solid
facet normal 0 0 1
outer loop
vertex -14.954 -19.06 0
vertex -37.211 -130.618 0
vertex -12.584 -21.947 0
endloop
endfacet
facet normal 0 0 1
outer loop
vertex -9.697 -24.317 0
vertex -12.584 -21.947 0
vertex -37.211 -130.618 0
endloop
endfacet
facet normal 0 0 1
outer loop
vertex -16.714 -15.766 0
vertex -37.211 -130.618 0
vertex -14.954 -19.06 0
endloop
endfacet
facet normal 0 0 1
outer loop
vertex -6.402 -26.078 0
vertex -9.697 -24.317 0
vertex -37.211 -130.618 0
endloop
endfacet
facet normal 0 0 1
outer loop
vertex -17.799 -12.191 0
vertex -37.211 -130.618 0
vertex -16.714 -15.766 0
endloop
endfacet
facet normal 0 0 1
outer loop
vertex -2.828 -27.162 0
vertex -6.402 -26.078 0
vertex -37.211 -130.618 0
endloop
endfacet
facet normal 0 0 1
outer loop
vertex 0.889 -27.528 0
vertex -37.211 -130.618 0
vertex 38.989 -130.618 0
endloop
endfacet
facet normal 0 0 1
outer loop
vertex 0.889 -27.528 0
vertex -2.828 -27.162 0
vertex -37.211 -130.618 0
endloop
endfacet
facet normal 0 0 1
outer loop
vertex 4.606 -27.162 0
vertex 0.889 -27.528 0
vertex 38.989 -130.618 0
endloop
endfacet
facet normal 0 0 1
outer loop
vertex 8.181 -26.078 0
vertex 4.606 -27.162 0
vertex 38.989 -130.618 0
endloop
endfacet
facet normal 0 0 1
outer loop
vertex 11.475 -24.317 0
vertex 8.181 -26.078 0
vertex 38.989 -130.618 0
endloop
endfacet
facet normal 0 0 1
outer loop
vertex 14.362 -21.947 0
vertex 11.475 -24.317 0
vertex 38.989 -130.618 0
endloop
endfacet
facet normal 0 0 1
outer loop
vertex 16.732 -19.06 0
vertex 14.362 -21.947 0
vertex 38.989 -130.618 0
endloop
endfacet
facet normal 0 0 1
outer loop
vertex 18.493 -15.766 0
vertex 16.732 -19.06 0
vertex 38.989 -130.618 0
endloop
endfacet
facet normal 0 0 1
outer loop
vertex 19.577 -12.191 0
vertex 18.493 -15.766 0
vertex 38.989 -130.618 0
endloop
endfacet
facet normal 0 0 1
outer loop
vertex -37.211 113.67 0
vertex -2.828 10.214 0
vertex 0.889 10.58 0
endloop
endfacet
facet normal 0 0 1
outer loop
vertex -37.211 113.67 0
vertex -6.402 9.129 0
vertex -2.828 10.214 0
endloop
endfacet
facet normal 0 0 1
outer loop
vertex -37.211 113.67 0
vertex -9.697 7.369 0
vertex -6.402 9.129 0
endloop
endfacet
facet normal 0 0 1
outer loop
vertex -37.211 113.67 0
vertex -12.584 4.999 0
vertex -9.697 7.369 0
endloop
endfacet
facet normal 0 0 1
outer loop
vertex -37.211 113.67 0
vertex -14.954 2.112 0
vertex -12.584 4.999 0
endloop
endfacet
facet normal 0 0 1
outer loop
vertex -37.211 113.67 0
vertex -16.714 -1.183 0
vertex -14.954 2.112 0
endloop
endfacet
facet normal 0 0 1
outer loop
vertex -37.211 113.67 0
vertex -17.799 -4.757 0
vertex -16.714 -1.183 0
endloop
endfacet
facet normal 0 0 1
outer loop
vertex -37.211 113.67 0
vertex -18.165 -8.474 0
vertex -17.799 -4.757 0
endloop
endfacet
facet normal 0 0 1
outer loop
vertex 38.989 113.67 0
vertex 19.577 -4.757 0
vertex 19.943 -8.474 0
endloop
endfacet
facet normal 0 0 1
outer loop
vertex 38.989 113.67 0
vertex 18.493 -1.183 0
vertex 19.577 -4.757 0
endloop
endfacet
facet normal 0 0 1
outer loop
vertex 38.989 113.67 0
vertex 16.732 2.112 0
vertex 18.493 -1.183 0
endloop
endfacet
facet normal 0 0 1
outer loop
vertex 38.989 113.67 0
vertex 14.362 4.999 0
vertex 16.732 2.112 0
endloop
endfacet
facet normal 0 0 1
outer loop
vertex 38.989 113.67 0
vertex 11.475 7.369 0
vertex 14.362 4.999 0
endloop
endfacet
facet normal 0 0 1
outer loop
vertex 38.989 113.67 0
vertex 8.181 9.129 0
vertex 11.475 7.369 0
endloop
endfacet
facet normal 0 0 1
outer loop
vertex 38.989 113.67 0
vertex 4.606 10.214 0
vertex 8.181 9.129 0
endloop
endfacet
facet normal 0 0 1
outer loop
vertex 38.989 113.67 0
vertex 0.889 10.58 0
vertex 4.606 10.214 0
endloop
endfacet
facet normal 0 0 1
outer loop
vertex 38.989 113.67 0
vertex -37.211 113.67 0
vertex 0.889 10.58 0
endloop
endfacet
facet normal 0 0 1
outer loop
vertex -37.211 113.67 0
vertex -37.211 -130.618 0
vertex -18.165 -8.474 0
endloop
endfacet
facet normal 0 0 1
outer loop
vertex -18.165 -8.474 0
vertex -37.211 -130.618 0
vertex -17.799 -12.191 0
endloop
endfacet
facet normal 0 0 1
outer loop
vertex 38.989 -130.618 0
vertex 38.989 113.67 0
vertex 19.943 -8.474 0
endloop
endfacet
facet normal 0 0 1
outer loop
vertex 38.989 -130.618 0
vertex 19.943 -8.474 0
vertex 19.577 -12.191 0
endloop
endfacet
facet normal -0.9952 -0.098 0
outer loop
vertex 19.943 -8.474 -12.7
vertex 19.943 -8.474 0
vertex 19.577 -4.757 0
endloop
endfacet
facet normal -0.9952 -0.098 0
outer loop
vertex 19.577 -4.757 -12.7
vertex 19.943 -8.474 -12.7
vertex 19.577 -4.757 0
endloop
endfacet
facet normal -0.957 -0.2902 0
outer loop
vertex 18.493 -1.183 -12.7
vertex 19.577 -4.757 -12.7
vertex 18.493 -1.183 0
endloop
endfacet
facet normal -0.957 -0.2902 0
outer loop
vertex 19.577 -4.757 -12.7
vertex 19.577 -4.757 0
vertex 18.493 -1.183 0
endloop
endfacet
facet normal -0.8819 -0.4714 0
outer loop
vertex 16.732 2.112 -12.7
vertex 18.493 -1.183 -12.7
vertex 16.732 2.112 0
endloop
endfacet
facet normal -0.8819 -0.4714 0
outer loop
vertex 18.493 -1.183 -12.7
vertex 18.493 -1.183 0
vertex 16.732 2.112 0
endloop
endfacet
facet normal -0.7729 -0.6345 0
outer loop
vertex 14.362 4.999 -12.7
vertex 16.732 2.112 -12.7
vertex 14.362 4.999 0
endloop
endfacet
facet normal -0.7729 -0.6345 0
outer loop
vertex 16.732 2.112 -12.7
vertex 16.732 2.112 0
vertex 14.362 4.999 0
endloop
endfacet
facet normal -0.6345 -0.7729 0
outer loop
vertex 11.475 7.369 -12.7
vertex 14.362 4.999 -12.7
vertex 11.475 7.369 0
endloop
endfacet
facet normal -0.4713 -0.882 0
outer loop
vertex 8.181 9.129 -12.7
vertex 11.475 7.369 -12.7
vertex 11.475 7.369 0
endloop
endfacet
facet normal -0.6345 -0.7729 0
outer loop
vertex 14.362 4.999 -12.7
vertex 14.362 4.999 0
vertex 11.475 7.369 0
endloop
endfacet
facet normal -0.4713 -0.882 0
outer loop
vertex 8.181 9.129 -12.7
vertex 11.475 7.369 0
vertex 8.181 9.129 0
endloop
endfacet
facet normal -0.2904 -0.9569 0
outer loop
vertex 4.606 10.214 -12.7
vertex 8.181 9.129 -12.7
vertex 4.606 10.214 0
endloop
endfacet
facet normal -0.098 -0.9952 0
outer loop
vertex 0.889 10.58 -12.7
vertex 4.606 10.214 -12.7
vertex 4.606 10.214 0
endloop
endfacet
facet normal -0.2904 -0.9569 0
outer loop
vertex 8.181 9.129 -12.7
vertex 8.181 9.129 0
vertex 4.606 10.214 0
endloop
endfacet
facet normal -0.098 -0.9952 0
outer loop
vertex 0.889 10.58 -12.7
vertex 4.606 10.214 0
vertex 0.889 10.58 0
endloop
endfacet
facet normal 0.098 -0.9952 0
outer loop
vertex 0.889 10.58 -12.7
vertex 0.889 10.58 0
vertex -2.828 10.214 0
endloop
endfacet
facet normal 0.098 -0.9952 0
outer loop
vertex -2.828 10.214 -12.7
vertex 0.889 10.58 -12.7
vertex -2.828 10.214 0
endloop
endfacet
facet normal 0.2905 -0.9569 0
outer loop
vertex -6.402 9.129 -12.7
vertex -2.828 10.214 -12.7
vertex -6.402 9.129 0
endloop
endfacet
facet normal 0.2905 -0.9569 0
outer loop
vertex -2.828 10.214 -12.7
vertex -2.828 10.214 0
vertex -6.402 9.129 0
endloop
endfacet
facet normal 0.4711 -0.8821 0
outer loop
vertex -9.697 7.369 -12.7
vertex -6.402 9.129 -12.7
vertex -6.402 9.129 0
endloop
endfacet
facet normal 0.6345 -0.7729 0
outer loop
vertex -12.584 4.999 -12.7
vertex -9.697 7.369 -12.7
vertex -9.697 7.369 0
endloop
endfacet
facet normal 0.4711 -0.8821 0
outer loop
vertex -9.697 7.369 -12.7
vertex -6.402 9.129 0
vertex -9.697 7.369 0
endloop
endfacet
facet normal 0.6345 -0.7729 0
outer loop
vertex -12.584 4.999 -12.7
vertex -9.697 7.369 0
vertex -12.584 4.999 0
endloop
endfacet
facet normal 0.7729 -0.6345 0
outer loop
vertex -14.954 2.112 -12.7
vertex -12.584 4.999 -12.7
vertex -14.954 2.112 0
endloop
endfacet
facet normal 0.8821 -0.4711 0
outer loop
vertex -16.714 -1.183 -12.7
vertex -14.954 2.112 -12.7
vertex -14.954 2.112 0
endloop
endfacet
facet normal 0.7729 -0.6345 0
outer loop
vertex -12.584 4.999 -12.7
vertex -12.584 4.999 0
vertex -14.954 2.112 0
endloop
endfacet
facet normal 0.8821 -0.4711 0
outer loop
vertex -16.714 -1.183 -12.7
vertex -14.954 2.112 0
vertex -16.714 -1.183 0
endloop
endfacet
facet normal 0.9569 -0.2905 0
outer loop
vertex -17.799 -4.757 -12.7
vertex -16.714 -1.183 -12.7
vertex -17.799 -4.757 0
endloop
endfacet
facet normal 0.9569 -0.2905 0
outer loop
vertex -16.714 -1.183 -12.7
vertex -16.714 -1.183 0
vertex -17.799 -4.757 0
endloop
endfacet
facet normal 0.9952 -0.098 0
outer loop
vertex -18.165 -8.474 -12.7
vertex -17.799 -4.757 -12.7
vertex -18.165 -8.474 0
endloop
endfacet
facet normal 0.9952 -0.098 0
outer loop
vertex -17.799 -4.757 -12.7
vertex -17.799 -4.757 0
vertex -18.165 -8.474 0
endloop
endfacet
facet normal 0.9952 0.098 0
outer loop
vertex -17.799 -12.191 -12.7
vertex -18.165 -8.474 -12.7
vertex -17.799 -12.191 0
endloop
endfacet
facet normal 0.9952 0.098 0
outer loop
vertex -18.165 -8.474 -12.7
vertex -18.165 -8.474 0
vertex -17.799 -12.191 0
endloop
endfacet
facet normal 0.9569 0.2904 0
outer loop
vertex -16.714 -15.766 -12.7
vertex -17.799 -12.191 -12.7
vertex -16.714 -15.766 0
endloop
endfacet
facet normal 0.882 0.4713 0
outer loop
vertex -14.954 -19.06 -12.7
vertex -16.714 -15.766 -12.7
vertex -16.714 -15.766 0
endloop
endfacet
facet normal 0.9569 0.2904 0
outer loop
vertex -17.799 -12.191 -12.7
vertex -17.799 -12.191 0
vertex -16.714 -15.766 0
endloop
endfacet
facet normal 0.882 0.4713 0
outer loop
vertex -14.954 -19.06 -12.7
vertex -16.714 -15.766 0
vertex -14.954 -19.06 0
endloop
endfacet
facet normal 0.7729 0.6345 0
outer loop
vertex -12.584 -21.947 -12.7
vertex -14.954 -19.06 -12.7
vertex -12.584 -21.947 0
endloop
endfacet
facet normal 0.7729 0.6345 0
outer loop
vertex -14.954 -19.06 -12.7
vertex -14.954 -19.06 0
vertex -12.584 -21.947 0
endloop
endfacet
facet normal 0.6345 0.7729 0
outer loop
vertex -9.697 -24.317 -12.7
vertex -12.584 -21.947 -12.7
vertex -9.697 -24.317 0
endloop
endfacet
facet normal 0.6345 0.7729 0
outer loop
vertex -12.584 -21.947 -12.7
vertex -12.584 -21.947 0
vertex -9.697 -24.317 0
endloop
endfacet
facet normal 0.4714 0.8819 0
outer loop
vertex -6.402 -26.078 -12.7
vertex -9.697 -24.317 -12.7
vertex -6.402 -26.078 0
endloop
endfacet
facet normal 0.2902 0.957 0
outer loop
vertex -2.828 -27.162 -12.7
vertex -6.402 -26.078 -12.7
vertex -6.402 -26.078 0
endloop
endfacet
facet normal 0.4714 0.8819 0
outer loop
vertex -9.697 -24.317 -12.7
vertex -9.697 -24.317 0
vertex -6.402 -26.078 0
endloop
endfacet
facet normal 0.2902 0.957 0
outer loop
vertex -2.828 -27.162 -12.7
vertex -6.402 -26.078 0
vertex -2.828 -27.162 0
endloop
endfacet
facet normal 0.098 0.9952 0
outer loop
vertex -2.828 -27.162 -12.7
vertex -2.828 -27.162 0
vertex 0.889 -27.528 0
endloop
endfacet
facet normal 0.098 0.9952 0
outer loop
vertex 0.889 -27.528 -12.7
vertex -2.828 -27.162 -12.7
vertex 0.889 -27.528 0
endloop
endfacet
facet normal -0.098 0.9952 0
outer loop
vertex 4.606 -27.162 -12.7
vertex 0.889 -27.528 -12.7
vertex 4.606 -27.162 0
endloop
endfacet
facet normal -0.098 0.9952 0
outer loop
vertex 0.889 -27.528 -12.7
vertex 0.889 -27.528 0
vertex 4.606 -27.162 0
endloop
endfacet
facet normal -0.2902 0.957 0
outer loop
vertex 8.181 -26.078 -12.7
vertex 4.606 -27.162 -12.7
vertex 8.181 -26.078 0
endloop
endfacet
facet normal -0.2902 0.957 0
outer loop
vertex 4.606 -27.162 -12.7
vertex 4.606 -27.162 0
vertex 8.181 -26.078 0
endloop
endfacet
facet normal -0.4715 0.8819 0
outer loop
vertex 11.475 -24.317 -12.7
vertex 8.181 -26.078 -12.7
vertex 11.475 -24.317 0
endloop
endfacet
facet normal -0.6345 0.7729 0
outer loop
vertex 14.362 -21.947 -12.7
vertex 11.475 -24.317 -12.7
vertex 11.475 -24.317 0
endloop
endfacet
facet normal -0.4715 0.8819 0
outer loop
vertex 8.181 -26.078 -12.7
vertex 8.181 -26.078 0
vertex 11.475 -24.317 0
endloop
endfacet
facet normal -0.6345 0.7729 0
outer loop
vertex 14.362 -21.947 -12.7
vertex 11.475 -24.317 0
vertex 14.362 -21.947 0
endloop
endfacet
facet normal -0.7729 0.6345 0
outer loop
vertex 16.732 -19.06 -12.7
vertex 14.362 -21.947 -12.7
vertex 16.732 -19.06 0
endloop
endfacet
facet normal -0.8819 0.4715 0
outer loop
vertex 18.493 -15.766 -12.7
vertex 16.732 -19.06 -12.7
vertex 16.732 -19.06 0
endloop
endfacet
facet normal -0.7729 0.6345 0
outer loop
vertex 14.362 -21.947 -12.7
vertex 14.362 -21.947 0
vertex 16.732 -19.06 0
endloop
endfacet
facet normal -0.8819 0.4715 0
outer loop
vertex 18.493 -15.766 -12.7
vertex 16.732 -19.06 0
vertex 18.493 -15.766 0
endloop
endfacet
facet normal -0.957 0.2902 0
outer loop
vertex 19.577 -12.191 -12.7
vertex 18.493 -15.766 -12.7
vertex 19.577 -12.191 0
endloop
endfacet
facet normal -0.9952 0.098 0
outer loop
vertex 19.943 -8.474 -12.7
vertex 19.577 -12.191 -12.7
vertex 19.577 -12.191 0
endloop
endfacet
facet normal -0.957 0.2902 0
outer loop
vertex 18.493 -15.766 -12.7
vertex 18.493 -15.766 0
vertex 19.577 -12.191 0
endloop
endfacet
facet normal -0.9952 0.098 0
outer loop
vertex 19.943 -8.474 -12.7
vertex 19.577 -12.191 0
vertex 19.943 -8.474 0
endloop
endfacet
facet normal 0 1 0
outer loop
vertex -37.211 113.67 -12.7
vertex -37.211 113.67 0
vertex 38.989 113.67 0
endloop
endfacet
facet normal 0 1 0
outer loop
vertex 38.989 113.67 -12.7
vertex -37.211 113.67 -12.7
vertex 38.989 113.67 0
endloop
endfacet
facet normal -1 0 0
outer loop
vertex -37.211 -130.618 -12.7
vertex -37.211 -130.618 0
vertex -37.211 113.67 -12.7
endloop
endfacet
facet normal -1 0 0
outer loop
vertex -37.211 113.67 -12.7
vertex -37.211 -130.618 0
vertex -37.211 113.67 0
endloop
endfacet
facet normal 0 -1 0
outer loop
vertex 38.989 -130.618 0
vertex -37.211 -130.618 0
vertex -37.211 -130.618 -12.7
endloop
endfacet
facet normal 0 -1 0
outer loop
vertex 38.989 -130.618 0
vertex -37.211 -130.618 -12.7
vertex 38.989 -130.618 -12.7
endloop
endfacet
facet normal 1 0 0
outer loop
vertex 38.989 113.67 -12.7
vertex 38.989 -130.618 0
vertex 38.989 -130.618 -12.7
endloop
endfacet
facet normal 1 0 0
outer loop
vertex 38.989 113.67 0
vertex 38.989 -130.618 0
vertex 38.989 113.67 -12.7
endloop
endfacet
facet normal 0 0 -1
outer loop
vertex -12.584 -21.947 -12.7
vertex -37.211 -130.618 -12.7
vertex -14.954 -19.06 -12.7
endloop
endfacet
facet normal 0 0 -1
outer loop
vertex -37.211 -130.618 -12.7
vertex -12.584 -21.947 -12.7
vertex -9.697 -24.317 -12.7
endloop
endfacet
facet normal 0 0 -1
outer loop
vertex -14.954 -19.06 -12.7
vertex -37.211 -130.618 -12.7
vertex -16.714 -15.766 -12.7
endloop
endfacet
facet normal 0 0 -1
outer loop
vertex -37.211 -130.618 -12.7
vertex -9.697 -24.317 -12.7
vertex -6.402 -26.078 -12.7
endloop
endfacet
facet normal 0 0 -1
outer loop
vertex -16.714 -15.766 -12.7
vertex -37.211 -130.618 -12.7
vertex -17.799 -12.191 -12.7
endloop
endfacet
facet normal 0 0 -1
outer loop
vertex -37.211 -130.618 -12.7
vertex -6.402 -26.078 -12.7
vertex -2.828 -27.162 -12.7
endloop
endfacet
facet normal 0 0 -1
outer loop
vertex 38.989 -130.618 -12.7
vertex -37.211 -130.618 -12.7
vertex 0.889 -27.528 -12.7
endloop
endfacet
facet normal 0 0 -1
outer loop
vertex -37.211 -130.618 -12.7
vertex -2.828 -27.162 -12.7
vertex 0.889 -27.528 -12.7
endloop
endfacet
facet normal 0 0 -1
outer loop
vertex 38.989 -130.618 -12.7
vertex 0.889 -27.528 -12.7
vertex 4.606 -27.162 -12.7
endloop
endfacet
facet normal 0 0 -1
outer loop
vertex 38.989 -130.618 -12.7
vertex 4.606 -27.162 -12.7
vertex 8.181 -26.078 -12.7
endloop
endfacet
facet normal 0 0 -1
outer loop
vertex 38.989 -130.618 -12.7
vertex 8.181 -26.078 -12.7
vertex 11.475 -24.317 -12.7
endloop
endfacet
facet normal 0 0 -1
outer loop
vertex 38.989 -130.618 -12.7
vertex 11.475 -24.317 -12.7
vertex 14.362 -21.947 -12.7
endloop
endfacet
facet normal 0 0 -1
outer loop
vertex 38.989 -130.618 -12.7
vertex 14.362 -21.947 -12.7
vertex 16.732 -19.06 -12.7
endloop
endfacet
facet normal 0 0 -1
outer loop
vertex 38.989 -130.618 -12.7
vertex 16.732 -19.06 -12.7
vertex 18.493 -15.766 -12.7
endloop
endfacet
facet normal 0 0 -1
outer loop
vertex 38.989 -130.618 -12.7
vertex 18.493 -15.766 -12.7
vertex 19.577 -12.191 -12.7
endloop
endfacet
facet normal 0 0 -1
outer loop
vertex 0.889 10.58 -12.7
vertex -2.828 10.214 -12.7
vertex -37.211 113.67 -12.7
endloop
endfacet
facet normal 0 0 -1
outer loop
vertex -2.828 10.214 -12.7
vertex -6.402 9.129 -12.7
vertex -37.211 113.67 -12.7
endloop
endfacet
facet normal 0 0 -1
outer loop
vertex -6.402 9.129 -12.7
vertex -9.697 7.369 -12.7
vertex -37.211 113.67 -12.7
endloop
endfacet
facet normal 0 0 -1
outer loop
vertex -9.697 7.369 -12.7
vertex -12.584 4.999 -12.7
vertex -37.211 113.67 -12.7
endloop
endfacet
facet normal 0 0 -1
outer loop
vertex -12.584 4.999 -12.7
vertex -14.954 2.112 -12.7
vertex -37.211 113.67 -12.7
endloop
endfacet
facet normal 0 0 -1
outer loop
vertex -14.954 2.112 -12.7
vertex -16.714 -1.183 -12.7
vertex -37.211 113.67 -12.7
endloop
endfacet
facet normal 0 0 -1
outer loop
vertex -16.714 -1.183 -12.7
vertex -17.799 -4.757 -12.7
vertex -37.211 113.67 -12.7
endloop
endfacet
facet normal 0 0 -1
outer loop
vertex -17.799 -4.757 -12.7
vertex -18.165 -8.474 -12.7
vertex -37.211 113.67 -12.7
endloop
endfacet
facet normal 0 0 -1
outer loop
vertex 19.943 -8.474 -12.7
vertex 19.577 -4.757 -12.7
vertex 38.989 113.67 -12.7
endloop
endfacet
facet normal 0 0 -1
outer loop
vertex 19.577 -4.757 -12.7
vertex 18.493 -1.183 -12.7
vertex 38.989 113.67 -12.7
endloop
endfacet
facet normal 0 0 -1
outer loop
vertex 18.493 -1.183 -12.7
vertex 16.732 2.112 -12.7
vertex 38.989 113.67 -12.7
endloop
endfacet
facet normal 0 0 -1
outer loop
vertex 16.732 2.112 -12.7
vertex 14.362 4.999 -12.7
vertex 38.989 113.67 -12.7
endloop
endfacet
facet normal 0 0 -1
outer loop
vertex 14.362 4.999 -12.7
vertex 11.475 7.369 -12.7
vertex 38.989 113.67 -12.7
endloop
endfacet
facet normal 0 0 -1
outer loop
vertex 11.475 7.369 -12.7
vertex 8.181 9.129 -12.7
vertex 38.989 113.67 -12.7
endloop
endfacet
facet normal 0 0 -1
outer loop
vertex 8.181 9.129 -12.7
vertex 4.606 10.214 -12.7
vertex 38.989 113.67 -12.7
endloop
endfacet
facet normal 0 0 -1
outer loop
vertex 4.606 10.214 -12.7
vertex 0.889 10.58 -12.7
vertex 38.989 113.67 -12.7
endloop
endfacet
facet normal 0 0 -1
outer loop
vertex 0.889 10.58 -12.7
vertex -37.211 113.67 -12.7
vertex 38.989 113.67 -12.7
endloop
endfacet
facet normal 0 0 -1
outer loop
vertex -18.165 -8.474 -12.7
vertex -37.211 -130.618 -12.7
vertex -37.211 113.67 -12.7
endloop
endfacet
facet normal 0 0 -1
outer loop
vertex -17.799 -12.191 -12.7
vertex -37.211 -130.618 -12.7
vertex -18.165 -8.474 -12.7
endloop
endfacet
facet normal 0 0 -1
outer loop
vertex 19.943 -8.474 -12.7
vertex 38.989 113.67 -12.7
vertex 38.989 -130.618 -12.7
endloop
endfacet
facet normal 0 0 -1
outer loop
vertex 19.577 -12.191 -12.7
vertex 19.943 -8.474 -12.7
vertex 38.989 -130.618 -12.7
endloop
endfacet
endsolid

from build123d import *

# Parameters (mm, degrees)
F0_W     = 76.2
F0_H     = 244.288212
F0_R     = 19.053929
F1_DEPTH = 12.7


with BuildPart() as f1:
    # F0 (on Top) → F1 (new body)
    with BuildSketch(Plane.XY):
        with Locations((0.889241, -8.474177)):
            Rectangle(F0_W, F0_H)
        with Locations((0.889241, -8.474177)):
            Circle(F0_R, mode=Mode.SUBTRACT)
    extrude(amount=-F1_DEPTH)


solid = f1.part
